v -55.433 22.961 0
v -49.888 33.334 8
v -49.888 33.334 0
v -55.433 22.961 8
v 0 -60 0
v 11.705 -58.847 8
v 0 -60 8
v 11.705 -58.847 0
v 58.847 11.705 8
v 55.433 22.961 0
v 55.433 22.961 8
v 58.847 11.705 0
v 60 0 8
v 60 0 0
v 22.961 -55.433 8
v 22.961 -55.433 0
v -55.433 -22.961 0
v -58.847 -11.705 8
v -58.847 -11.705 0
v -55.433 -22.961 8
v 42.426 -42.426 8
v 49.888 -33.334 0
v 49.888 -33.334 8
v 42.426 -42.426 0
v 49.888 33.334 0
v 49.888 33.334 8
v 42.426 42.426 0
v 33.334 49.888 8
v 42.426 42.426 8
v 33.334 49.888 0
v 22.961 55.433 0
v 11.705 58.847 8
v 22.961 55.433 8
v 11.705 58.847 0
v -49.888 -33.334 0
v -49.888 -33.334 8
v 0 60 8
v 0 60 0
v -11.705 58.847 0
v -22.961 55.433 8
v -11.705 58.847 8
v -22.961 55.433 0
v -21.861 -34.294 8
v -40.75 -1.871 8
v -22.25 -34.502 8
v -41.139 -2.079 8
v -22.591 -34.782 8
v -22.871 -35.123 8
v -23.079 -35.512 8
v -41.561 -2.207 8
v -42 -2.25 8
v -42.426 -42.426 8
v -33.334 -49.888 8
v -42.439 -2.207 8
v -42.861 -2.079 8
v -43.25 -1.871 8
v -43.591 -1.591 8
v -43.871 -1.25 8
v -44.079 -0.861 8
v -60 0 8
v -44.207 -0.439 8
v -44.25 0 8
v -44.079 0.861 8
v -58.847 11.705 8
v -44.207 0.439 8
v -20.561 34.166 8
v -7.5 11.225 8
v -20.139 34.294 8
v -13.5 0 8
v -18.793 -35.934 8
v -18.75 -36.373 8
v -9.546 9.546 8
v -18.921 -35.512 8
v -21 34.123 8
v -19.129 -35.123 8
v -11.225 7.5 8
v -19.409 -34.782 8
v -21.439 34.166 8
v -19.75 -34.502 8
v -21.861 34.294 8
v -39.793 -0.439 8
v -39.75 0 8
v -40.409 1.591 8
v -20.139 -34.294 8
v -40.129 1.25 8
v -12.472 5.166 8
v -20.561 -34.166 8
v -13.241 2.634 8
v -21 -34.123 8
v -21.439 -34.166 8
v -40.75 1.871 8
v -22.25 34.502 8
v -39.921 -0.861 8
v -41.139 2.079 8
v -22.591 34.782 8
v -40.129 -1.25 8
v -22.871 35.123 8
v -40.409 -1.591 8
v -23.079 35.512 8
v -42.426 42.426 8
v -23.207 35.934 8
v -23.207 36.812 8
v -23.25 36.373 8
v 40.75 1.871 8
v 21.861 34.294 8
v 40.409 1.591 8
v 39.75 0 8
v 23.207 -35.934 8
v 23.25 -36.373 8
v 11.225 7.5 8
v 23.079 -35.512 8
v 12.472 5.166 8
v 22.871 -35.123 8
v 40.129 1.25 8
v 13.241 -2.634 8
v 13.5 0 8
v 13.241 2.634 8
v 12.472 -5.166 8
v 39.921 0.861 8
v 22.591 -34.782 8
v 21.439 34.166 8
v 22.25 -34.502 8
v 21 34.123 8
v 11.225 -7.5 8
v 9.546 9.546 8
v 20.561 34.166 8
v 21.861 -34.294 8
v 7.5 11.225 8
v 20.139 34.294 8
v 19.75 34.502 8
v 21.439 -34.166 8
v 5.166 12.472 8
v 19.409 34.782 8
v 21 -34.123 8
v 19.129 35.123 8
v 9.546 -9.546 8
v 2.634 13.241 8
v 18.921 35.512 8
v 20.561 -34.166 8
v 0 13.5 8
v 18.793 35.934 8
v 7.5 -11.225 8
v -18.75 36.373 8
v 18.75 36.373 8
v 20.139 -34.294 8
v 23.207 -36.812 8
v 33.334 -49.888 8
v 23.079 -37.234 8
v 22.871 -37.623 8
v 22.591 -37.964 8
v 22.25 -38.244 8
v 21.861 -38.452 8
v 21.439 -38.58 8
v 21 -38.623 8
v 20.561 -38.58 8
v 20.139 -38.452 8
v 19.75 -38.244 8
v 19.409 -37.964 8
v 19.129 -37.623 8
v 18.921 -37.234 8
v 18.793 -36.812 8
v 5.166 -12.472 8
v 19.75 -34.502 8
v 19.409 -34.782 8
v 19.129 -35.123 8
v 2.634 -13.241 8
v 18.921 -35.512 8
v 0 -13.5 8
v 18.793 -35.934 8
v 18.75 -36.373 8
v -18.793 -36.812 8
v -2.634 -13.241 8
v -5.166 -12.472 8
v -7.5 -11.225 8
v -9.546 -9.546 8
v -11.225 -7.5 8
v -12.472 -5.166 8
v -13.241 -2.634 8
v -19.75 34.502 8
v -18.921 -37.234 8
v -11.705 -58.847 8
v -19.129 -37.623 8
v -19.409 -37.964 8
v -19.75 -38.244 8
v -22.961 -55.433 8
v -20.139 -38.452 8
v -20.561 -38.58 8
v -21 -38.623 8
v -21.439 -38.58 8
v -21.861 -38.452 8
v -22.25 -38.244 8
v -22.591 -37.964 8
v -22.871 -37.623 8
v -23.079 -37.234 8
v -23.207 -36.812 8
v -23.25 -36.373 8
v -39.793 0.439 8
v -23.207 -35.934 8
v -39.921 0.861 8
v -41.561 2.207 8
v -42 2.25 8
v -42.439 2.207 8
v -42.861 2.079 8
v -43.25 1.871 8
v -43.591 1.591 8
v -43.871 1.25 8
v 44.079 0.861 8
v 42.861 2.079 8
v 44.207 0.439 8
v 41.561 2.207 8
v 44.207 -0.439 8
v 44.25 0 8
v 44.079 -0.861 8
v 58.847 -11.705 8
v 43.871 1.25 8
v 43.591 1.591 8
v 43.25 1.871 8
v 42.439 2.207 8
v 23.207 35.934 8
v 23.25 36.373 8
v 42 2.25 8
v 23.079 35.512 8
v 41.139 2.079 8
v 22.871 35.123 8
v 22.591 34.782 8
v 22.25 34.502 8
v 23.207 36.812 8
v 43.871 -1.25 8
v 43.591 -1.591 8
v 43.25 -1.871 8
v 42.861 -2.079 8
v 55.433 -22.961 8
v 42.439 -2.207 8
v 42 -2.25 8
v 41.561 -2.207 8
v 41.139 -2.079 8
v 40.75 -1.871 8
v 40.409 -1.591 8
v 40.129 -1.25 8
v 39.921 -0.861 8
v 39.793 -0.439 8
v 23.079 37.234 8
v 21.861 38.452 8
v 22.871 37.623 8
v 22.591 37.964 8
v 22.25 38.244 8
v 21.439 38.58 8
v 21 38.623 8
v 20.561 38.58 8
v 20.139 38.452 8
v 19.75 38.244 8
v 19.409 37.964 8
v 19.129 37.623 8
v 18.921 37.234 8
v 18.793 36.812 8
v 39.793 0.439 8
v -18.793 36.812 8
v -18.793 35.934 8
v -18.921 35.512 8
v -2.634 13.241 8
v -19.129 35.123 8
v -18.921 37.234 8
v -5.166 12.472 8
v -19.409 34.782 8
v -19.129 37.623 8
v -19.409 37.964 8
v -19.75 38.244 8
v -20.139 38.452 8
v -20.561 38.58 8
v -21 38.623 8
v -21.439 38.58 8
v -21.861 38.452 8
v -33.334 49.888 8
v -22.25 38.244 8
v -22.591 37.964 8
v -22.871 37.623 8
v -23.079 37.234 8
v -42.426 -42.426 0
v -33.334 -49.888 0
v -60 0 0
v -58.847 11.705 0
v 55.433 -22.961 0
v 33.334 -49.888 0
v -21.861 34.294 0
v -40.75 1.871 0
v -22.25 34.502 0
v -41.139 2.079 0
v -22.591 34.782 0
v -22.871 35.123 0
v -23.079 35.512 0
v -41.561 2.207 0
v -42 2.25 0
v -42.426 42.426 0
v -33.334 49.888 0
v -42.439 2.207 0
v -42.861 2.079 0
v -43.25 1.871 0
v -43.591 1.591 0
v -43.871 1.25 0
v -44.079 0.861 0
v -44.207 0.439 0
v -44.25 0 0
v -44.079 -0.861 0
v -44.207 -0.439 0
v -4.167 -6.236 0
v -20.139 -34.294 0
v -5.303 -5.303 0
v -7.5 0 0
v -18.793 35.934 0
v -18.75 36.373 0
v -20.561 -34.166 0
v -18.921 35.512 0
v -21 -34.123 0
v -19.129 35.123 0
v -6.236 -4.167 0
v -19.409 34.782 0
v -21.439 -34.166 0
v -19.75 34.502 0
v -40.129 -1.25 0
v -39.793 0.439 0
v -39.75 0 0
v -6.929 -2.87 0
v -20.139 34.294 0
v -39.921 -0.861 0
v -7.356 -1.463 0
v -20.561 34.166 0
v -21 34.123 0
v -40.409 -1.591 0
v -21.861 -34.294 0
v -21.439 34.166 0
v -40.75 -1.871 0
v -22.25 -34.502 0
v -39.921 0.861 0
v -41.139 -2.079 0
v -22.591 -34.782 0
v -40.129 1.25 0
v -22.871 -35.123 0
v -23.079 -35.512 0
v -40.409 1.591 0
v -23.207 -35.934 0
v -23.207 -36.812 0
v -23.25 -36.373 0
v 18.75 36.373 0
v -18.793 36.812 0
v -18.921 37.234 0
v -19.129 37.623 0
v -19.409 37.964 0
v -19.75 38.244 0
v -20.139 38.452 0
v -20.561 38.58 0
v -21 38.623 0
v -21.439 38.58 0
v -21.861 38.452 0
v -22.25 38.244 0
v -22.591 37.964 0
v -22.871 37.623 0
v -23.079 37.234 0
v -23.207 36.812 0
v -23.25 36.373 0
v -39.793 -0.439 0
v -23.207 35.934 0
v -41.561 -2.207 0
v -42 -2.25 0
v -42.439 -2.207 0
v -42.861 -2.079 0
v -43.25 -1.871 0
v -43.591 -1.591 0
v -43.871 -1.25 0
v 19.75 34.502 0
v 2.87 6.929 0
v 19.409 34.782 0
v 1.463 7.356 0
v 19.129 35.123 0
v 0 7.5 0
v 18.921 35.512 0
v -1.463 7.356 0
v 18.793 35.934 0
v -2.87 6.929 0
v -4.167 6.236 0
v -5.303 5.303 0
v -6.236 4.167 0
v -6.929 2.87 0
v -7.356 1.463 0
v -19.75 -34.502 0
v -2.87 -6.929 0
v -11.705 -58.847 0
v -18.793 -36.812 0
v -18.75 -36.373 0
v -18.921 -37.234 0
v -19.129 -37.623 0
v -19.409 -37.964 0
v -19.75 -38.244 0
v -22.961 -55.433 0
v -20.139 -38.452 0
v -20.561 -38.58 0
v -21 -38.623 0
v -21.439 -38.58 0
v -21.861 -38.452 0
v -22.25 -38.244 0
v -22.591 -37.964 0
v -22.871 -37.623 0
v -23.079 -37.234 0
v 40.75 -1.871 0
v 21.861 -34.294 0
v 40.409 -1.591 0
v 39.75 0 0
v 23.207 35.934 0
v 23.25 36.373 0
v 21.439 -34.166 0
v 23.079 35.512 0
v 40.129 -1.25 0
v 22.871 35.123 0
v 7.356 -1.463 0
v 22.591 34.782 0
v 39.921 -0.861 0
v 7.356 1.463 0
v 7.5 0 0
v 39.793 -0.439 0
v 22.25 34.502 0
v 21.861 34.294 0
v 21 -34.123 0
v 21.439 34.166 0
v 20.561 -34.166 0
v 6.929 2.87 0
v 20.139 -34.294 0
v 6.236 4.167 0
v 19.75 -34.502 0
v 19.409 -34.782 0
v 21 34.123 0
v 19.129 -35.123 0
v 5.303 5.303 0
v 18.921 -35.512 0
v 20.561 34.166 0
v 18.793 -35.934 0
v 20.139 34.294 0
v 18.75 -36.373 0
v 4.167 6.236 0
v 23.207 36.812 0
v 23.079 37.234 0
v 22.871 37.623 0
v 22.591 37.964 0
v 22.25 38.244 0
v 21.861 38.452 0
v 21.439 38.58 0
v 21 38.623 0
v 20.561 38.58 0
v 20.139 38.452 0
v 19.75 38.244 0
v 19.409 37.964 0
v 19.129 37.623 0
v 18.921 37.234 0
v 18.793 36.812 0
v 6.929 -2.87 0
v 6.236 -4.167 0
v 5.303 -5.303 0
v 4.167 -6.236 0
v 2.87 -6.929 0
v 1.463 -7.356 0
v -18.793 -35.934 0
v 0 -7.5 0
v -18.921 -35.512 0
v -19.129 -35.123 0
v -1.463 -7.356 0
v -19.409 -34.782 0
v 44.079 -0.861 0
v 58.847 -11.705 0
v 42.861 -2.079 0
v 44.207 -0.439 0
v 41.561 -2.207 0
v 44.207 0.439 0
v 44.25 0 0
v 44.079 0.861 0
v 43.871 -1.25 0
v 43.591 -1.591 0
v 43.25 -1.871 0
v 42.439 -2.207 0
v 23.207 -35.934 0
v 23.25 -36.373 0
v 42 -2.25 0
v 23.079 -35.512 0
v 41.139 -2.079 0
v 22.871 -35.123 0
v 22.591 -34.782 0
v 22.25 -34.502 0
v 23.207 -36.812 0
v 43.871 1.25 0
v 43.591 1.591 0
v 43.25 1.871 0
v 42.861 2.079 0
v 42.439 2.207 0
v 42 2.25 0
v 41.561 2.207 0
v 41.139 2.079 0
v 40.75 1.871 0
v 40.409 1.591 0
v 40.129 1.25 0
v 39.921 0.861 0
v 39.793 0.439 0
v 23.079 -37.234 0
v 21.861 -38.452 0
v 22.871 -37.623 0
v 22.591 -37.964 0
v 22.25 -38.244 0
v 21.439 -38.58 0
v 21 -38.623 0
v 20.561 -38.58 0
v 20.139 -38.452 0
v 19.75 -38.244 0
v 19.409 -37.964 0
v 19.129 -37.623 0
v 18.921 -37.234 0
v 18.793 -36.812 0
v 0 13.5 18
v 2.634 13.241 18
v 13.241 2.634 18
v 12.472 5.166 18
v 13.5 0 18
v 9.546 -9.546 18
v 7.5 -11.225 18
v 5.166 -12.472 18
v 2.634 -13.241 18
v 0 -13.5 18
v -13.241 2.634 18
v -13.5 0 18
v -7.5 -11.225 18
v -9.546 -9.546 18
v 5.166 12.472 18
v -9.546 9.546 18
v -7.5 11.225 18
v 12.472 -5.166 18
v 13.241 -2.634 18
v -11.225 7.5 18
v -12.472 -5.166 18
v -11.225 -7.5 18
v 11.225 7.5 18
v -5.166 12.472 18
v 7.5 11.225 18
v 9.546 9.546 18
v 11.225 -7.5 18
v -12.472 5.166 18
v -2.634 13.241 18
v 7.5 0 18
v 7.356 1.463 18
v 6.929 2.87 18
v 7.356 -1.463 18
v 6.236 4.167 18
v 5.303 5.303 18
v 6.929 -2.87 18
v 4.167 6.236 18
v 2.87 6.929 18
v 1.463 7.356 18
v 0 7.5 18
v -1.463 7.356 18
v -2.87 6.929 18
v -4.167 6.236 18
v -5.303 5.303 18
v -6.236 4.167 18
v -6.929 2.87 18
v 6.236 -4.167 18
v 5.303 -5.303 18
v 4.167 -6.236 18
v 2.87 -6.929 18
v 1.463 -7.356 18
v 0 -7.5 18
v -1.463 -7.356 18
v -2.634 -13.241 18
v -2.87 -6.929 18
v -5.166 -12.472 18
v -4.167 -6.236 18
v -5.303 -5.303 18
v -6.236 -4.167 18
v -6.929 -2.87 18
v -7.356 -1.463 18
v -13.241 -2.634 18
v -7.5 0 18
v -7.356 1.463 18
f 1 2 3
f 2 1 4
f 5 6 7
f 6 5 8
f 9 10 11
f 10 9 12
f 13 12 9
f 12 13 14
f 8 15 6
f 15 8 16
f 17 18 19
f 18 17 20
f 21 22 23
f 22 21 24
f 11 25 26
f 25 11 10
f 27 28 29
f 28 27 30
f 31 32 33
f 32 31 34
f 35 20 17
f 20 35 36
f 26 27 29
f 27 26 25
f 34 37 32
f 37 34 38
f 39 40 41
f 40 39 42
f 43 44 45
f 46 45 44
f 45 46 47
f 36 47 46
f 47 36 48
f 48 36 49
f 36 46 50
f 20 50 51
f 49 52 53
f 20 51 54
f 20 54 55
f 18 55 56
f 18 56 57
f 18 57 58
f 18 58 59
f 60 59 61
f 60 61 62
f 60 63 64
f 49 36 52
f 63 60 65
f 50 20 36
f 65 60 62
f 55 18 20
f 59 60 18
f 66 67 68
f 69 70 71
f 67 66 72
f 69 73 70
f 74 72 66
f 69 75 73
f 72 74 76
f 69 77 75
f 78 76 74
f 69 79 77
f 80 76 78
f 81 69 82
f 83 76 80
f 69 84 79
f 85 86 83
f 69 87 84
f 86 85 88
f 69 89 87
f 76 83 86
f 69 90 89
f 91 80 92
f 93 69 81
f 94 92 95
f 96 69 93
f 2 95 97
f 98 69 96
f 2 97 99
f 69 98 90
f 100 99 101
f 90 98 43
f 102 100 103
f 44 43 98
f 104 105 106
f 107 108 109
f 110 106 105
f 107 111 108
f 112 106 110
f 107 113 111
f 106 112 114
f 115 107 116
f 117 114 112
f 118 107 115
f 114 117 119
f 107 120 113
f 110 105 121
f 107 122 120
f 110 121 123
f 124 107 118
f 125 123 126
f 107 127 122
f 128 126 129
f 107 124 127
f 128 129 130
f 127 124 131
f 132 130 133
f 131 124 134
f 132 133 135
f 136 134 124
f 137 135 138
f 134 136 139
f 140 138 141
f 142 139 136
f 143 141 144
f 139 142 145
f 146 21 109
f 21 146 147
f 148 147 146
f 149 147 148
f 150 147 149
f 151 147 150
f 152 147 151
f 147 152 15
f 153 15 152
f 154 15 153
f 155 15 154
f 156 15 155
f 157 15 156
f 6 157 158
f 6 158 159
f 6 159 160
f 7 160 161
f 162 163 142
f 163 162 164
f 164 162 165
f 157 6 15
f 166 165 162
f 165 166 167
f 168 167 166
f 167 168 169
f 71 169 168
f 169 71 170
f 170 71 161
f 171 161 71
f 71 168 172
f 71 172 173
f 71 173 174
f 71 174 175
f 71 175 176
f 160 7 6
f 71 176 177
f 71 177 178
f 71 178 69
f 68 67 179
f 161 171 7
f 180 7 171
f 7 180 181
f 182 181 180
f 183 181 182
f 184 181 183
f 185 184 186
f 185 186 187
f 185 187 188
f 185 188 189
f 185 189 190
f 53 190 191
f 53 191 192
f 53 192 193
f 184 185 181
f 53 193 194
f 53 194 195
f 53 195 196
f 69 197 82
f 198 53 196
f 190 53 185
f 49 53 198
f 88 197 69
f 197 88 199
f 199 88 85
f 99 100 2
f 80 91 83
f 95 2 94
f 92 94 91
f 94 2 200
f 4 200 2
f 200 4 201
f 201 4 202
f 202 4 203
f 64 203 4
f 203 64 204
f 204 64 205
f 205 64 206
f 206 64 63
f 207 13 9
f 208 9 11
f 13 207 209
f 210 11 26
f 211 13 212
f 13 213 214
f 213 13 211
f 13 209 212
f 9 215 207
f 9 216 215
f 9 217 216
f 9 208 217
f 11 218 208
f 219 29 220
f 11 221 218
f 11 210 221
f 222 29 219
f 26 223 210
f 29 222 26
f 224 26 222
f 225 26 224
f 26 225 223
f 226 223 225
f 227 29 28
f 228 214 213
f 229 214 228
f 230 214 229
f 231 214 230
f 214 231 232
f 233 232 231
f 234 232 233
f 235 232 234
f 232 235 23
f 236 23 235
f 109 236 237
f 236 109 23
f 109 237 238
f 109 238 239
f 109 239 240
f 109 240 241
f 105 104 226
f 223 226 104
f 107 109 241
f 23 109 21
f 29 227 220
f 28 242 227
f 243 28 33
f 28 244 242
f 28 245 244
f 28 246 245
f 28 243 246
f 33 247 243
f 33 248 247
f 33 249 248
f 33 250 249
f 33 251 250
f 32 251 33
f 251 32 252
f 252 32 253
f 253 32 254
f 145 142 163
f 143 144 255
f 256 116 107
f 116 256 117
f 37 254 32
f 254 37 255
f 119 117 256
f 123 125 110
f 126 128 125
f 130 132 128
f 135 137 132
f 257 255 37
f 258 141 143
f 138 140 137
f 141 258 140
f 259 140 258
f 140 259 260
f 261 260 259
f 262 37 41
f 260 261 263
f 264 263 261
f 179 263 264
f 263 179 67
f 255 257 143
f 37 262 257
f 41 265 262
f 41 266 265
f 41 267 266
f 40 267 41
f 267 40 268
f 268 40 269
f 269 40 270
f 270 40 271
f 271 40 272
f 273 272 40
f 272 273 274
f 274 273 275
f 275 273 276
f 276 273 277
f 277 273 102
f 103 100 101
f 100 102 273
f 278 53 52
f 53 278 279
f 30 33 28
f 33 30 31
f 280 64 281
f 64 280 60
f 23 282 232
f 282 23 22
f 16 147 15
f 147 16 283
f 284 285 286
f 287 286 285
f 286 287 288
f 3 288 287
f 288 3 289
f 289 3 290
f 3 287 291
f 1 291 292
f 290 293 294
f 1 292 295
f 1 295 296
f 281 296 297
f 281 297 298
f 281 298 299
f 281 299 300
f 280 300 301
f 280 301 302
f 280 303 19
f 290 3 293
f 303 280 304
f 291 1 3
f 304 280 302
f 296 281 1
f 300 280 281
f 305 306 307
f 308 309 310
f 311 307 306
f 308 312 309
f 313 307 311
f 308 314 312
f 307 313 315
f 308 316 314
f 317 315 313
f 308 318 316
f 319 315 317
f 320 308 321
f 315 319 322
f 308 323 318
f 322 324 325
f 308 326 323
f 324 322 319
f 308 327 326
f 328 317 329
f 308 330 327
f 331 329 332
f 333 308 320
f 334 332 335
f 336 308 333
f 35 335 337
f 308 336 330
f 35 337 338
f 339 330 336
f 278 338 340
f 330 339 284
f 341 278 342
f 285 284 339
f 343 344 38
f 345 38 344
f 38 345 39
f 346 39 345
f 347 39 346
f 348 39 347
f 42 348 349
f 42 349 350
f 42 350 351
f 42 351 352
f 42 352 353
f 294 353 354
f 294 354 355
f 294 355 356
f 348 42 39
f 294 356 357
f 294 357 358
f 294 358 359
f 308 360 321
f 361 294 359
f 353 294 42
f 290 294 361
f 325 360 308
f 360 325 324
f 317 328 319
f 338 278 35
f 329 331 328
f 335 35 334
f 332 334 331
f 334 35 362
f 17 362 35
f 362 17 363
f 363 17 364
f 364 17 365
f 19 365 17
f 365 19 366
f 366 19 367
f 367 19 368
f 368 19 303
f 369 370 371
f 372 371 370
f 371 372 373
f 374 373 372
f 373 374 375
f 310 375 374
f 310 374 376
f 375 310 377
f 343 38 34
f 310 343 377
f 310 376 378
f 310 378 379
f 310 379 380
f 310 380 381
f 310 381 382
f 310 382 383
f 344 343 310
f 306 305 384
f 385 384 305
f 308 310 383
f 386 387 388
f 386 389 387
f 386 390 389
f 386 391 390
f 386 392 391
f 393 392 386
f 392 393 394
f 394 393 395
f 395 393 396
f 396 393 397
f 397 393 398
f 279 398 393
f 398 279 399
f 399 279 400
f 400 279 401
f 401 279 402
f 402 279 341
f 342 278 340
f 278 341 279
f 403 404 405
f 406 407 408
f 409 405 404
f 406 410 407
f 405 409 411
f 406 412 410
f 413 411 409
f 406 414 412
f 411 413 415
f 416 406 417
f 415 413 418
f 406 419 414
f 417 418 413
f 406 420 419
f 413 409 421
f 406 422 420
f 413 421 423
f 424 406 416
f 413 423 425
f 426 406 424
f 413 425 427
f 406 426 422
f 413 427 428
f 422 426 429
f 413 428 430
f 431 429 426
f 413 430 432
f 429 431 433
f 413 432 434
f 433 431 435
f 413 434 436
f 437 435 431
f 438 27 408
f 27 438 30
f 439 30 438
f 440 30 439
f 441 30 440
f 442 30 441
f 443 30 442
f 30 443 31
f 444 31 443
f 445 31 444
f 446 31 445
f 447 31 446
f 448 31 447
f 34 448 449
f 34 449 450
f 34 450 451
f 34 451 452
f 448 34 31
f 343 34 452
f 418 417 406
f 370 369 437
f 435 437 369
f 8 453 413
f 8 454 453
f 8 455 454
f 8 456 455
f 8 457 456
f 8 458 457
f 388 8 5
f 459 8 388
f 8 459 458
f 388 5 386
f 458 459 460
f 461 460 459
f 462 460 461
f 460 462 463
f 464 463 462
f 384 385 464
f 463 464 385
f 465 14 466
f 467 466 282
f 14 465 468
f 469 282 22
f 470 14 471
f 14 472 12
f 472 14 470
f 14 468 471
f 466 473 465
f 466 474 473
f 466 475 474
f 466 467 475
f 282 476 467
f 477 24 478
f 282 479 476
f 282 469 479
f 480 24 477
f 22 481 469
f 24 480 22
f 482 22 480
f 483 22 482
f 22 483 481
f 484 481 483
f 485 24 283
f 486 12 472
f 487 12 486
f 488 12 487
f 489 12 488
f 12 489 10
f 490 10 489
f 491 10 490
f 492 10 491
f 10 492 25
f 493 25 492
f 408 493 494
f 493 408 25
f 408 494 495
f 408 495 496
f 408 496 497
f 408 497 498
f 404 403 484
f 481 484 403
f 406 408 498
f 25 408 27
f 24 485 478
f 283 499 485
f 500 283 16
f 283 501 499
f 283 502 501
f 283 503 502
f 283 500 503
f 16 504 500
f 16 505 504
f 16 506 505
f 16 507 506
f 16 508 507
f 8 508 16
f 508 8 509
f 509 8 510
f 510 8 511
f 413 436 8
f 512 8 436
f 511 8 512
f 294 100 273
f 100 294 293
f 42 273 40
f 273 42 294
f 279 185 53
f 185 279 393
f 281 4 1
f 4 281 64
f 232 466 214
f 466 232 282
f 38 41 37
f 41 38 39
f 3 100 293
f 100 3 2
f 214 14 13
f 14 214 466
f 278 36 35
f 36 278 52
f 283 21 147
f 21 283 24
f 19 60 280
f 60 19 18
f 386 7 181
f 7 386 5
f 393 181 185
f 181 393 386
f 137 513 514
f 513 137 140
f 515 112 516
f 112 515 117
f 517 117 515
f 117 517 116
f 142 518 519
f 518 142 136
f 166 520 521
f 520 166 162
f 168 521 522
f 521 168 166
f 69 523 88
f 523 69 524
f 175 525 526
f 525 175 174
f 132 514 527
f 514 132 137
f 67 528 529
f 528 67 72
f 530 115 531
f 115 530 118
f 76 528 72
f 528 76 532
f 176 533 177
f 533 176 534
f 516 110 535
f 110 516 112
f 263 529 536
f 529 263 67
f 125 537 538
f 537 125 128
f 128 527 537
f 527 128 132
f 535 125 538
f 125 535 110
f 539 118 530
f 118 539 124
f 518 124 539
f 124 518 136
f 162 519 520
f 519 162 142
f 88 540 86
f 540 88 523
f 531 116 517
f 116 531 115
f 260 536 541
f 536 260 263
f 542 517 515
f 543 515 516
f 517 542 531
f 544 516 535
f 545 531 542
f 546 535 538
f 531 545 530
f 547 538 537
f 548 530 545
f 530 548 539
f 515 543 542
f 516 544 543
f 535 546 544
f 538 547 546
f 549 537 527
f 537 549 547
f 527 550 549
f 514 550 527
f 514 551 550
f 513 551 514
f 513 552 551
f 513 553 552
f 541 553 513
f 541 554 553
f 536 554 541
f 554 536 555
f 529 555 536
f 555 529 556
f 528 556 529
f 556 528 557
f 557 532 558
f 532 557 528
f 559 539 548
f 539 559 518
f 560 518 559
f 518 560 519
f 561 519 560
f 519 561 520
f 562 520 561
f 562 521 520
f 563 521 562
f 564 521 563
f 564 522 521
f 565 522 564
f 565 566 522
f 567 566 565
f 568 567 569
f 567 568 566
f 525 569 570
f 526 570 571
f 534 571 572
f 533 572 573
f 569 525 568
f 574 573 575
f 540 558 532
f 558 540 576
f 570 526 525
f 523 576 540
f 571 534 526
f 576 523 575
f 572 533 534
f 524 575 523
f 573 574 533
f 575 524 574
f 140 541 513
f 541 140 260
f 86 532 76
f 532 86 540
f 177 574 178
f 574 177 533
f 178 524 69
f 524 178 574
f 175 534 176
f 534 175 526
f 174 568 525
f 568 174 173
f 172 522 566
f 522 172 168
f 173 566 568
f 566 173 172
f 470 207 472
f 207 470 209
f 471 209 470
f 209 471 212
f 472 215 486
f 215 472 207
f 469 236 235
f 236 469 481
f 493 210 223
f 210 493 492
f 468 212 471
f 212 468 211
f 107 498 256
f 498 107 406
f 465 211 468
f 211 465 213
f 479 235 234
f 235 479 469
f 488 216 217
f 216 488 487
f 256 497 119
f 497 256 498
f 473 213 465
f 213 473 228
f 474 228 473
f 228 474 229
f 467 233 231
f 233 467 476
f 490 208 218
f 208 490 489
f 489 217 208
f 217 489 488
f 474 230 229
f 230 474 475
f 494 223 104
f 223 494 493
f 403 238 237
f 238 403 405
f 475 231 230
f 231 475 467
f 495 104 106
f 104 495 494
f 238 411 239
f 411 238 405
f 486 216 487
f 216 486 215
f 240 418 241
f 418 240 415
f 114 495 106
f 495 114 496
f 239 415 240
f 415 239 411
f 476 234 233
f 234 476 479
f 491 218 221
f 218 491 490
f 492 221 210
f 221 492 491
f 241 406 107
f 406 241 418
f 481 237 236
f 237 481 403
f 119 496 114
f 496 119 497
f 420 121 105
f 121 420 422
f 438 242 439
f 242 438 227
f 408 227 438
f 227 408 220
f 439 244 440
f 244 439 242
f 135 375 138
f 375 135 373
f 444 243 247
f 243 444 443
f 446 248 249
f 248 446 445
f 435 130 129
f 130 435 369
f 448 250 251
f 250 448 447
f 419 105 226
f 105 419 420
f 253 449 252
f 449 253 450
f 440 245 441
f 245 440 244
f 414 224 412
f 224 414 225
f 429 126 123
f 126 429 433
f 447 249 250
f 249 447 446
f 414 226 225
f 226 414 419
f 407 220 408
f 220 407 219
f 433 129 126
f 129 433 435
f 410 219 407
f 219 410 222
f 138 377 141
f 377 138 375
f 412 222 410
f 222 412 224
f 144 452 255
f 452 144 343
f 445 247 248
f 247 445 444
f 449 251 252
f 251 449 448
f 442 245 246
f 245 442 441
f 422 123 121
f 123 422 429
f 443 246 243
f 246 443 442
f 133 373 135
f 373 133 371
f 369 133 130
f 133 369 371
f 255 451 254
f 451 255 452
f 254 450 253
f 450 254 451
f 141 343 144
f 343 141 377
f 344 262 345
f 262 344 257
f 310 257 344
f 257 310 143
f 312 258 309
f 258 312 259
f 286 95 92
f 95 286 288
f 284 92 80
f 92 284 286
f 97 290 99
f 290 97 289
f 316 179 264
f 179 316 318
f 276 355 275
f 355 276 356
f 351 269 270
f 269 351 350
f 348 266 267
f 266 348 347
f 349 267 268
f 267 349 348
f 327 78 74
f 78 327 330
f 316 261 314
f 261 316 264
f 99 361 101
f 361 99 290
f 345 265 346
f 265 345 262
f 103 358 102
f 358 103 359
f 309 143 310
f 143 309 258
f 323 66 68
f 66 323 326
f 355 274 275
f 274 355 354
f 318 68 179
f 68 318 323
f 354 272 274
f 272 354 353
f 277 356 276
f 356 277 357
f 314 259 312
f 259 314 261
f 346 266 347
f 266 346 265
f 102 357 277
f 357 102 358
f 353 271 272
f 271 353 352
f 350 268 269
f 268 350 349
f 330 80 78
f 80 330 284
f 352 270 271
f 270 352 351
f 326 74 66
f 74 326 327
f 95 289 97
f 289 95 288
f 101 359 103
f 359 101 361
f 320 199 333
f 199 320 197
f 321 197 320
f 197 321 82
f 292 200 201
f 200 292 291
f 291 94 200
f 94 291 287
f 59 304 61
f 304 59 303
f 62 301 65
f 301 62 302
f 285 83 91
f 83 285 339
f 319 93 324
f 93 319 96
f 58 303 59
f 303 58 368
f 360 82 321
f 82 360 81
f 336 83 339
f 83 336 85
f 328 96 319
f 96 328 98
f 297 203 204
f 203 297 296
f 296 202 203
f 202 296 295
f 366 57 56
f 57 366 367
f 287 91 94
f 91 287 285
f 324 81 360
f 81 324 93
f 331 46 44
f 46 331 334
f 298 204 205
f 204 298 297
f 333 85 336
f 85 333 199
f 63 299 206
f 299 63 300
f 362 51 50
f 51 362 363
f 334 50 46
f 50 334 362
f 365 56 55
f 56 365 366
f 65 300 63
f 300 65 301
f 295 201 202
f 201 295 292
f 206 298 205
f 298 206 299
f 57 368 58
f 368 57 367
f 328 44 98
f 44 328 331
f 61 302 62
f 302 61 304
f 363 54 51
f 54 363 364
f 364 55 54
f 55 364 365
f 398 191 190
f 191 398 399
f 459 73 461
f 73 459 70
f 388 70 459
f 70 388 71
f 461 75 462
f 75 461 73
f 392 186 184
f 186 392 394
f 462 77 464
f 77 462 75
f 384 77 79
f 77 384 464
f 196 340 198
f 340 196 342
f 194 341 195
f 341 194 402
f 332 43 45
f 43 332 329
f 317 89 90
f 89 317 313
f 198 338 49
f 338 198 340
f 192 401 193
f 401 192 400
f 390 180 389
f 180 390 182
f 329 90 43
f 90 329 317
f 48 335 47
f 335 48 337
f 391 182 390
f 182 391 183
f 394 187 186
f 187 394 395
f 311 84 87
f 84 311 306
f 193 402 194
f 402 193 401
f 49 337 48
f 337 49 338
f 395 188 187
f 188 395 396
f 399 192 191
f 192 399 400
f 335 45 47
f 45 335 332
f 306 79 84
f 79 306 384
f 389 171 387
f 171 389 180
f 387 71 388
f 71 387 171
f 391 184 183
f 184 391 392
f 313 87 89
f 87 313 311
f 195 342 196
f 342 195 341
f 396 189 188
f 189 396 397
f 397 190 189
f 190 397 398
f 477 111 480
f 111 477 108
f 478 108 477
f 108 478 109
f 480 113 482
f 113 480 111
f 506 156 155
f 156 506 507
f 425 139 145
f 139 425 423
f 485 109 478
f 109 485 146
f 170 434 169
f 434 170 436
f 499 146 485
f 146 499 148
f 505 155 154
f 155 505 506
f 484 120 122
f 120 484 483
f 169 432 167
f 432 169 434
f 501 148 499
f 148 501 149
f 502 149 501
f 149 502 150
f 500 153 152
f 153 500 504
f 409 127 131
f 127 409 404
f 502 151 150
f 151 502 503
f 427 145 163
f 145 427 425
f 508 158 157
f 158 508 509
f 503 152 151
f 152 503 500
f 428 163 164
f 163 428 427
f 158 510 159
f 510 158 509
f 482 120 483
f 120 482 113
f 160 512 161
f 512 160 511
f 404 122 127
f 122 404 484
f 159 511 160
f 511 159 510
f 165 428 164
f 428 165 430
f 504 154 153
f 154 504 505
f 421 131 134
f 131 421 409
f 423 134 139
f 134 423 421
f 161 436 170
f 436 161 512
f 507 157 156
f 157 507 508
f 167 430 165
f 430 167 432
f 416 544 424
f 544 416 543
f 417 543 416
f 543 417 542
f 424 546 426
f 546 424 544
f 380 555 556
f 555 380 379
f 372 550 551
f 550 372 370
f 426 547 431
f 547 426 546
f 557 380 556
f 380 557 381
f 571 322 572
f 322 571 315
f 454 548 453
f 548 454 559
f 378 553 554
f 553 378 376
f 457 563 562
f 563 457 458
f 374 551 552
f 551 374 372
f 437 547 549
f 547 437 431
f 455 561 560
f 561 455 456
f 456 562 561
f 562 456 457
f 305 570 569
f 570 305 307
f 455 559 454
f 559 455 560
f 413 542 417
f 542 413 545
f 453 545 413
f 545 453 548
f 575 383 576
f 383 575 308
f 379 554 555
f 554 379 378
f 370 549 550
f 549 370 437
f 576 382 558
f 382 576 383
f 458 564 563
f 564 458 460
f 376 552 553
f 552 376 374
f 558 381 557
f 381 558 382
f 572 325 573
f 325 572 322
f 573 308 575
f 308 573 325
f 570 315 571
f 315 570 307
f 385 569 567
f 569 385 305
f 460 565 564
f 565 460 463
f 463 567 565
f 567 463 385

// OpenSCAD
$fn = 32;

// ----------------------------------------------------------------------
// Flange Ø120 x 8
// 6 holes on a Ø84 bolt circle, bolted joints
// ----------------------------------------------------------------------

// --- parameters (mm) ---
flange_d = 120;  // outside diameter of the flange
thickness = 8;   // flange thickness
holes = 6;       // number of bolt holes
pcd = 84;        // bolt circle diameter
start_deg = 0;   // angle of the first hole, from +X
hole_d = 4.5;    // bolt hole diameter
bore_d = 15;     // central through bore
hub_d = 27;      // hub outside diameter
hub_h = 10;      // hub height above the flange face (0 = no hub)

// --- derived feature positions (mm) ---
height = thickness + hub_h;  // = 18   overall height of the part
pcd_r = pcd / 2;             // = 42   bolt circle radius
hole_step = 360 / holes;     // = 60   angular pitch
feature_centers = [
  [pcd_r * cos(start_deg + 0 * hole_step), pcd_r * sin(start_deg + 0 * hole_step)],
  [pcd_r * cos(start_deg + 1 * hole_step), pcd_r * sin(start_deg + 1 * hole_step)],
  [pcd_r * cos(start_deg + 2 * hole_step), pcd_r * sin(start_deg + 2 * hole_step)],
  [pcd_r * cos(start_deg + 3 * hole_step), pcd_r * sin(start_deg + 3 * hole_step)],
  [pcd_r * cos(start_deg + 4 * hole_step), pcd_r * sin(start_deg + 4 * hole_step)],
  [pcd_r * cos(start_deg + 5 * hole_step), pcd_r * sin(start_deg + 5 * hole_step)]
];   // bolt hole centres on the pitch circle

// flange disc, every hole and the bore cut straight through
difference() {
  union() {
    cylinder(d = flange_d, h = thickness);
    cylinder(d = hub_d, h = height);  // hub, overlapped into the flange
  }
  translate([0, 0, -1]) cylinder(d = bore_d, h = height + 2);  // bore, through
  for (centre = feature_centers)
    translate([centre[0], centre[1], -1]) cylinder(d = hole_d, h = thickness + 2);
}
